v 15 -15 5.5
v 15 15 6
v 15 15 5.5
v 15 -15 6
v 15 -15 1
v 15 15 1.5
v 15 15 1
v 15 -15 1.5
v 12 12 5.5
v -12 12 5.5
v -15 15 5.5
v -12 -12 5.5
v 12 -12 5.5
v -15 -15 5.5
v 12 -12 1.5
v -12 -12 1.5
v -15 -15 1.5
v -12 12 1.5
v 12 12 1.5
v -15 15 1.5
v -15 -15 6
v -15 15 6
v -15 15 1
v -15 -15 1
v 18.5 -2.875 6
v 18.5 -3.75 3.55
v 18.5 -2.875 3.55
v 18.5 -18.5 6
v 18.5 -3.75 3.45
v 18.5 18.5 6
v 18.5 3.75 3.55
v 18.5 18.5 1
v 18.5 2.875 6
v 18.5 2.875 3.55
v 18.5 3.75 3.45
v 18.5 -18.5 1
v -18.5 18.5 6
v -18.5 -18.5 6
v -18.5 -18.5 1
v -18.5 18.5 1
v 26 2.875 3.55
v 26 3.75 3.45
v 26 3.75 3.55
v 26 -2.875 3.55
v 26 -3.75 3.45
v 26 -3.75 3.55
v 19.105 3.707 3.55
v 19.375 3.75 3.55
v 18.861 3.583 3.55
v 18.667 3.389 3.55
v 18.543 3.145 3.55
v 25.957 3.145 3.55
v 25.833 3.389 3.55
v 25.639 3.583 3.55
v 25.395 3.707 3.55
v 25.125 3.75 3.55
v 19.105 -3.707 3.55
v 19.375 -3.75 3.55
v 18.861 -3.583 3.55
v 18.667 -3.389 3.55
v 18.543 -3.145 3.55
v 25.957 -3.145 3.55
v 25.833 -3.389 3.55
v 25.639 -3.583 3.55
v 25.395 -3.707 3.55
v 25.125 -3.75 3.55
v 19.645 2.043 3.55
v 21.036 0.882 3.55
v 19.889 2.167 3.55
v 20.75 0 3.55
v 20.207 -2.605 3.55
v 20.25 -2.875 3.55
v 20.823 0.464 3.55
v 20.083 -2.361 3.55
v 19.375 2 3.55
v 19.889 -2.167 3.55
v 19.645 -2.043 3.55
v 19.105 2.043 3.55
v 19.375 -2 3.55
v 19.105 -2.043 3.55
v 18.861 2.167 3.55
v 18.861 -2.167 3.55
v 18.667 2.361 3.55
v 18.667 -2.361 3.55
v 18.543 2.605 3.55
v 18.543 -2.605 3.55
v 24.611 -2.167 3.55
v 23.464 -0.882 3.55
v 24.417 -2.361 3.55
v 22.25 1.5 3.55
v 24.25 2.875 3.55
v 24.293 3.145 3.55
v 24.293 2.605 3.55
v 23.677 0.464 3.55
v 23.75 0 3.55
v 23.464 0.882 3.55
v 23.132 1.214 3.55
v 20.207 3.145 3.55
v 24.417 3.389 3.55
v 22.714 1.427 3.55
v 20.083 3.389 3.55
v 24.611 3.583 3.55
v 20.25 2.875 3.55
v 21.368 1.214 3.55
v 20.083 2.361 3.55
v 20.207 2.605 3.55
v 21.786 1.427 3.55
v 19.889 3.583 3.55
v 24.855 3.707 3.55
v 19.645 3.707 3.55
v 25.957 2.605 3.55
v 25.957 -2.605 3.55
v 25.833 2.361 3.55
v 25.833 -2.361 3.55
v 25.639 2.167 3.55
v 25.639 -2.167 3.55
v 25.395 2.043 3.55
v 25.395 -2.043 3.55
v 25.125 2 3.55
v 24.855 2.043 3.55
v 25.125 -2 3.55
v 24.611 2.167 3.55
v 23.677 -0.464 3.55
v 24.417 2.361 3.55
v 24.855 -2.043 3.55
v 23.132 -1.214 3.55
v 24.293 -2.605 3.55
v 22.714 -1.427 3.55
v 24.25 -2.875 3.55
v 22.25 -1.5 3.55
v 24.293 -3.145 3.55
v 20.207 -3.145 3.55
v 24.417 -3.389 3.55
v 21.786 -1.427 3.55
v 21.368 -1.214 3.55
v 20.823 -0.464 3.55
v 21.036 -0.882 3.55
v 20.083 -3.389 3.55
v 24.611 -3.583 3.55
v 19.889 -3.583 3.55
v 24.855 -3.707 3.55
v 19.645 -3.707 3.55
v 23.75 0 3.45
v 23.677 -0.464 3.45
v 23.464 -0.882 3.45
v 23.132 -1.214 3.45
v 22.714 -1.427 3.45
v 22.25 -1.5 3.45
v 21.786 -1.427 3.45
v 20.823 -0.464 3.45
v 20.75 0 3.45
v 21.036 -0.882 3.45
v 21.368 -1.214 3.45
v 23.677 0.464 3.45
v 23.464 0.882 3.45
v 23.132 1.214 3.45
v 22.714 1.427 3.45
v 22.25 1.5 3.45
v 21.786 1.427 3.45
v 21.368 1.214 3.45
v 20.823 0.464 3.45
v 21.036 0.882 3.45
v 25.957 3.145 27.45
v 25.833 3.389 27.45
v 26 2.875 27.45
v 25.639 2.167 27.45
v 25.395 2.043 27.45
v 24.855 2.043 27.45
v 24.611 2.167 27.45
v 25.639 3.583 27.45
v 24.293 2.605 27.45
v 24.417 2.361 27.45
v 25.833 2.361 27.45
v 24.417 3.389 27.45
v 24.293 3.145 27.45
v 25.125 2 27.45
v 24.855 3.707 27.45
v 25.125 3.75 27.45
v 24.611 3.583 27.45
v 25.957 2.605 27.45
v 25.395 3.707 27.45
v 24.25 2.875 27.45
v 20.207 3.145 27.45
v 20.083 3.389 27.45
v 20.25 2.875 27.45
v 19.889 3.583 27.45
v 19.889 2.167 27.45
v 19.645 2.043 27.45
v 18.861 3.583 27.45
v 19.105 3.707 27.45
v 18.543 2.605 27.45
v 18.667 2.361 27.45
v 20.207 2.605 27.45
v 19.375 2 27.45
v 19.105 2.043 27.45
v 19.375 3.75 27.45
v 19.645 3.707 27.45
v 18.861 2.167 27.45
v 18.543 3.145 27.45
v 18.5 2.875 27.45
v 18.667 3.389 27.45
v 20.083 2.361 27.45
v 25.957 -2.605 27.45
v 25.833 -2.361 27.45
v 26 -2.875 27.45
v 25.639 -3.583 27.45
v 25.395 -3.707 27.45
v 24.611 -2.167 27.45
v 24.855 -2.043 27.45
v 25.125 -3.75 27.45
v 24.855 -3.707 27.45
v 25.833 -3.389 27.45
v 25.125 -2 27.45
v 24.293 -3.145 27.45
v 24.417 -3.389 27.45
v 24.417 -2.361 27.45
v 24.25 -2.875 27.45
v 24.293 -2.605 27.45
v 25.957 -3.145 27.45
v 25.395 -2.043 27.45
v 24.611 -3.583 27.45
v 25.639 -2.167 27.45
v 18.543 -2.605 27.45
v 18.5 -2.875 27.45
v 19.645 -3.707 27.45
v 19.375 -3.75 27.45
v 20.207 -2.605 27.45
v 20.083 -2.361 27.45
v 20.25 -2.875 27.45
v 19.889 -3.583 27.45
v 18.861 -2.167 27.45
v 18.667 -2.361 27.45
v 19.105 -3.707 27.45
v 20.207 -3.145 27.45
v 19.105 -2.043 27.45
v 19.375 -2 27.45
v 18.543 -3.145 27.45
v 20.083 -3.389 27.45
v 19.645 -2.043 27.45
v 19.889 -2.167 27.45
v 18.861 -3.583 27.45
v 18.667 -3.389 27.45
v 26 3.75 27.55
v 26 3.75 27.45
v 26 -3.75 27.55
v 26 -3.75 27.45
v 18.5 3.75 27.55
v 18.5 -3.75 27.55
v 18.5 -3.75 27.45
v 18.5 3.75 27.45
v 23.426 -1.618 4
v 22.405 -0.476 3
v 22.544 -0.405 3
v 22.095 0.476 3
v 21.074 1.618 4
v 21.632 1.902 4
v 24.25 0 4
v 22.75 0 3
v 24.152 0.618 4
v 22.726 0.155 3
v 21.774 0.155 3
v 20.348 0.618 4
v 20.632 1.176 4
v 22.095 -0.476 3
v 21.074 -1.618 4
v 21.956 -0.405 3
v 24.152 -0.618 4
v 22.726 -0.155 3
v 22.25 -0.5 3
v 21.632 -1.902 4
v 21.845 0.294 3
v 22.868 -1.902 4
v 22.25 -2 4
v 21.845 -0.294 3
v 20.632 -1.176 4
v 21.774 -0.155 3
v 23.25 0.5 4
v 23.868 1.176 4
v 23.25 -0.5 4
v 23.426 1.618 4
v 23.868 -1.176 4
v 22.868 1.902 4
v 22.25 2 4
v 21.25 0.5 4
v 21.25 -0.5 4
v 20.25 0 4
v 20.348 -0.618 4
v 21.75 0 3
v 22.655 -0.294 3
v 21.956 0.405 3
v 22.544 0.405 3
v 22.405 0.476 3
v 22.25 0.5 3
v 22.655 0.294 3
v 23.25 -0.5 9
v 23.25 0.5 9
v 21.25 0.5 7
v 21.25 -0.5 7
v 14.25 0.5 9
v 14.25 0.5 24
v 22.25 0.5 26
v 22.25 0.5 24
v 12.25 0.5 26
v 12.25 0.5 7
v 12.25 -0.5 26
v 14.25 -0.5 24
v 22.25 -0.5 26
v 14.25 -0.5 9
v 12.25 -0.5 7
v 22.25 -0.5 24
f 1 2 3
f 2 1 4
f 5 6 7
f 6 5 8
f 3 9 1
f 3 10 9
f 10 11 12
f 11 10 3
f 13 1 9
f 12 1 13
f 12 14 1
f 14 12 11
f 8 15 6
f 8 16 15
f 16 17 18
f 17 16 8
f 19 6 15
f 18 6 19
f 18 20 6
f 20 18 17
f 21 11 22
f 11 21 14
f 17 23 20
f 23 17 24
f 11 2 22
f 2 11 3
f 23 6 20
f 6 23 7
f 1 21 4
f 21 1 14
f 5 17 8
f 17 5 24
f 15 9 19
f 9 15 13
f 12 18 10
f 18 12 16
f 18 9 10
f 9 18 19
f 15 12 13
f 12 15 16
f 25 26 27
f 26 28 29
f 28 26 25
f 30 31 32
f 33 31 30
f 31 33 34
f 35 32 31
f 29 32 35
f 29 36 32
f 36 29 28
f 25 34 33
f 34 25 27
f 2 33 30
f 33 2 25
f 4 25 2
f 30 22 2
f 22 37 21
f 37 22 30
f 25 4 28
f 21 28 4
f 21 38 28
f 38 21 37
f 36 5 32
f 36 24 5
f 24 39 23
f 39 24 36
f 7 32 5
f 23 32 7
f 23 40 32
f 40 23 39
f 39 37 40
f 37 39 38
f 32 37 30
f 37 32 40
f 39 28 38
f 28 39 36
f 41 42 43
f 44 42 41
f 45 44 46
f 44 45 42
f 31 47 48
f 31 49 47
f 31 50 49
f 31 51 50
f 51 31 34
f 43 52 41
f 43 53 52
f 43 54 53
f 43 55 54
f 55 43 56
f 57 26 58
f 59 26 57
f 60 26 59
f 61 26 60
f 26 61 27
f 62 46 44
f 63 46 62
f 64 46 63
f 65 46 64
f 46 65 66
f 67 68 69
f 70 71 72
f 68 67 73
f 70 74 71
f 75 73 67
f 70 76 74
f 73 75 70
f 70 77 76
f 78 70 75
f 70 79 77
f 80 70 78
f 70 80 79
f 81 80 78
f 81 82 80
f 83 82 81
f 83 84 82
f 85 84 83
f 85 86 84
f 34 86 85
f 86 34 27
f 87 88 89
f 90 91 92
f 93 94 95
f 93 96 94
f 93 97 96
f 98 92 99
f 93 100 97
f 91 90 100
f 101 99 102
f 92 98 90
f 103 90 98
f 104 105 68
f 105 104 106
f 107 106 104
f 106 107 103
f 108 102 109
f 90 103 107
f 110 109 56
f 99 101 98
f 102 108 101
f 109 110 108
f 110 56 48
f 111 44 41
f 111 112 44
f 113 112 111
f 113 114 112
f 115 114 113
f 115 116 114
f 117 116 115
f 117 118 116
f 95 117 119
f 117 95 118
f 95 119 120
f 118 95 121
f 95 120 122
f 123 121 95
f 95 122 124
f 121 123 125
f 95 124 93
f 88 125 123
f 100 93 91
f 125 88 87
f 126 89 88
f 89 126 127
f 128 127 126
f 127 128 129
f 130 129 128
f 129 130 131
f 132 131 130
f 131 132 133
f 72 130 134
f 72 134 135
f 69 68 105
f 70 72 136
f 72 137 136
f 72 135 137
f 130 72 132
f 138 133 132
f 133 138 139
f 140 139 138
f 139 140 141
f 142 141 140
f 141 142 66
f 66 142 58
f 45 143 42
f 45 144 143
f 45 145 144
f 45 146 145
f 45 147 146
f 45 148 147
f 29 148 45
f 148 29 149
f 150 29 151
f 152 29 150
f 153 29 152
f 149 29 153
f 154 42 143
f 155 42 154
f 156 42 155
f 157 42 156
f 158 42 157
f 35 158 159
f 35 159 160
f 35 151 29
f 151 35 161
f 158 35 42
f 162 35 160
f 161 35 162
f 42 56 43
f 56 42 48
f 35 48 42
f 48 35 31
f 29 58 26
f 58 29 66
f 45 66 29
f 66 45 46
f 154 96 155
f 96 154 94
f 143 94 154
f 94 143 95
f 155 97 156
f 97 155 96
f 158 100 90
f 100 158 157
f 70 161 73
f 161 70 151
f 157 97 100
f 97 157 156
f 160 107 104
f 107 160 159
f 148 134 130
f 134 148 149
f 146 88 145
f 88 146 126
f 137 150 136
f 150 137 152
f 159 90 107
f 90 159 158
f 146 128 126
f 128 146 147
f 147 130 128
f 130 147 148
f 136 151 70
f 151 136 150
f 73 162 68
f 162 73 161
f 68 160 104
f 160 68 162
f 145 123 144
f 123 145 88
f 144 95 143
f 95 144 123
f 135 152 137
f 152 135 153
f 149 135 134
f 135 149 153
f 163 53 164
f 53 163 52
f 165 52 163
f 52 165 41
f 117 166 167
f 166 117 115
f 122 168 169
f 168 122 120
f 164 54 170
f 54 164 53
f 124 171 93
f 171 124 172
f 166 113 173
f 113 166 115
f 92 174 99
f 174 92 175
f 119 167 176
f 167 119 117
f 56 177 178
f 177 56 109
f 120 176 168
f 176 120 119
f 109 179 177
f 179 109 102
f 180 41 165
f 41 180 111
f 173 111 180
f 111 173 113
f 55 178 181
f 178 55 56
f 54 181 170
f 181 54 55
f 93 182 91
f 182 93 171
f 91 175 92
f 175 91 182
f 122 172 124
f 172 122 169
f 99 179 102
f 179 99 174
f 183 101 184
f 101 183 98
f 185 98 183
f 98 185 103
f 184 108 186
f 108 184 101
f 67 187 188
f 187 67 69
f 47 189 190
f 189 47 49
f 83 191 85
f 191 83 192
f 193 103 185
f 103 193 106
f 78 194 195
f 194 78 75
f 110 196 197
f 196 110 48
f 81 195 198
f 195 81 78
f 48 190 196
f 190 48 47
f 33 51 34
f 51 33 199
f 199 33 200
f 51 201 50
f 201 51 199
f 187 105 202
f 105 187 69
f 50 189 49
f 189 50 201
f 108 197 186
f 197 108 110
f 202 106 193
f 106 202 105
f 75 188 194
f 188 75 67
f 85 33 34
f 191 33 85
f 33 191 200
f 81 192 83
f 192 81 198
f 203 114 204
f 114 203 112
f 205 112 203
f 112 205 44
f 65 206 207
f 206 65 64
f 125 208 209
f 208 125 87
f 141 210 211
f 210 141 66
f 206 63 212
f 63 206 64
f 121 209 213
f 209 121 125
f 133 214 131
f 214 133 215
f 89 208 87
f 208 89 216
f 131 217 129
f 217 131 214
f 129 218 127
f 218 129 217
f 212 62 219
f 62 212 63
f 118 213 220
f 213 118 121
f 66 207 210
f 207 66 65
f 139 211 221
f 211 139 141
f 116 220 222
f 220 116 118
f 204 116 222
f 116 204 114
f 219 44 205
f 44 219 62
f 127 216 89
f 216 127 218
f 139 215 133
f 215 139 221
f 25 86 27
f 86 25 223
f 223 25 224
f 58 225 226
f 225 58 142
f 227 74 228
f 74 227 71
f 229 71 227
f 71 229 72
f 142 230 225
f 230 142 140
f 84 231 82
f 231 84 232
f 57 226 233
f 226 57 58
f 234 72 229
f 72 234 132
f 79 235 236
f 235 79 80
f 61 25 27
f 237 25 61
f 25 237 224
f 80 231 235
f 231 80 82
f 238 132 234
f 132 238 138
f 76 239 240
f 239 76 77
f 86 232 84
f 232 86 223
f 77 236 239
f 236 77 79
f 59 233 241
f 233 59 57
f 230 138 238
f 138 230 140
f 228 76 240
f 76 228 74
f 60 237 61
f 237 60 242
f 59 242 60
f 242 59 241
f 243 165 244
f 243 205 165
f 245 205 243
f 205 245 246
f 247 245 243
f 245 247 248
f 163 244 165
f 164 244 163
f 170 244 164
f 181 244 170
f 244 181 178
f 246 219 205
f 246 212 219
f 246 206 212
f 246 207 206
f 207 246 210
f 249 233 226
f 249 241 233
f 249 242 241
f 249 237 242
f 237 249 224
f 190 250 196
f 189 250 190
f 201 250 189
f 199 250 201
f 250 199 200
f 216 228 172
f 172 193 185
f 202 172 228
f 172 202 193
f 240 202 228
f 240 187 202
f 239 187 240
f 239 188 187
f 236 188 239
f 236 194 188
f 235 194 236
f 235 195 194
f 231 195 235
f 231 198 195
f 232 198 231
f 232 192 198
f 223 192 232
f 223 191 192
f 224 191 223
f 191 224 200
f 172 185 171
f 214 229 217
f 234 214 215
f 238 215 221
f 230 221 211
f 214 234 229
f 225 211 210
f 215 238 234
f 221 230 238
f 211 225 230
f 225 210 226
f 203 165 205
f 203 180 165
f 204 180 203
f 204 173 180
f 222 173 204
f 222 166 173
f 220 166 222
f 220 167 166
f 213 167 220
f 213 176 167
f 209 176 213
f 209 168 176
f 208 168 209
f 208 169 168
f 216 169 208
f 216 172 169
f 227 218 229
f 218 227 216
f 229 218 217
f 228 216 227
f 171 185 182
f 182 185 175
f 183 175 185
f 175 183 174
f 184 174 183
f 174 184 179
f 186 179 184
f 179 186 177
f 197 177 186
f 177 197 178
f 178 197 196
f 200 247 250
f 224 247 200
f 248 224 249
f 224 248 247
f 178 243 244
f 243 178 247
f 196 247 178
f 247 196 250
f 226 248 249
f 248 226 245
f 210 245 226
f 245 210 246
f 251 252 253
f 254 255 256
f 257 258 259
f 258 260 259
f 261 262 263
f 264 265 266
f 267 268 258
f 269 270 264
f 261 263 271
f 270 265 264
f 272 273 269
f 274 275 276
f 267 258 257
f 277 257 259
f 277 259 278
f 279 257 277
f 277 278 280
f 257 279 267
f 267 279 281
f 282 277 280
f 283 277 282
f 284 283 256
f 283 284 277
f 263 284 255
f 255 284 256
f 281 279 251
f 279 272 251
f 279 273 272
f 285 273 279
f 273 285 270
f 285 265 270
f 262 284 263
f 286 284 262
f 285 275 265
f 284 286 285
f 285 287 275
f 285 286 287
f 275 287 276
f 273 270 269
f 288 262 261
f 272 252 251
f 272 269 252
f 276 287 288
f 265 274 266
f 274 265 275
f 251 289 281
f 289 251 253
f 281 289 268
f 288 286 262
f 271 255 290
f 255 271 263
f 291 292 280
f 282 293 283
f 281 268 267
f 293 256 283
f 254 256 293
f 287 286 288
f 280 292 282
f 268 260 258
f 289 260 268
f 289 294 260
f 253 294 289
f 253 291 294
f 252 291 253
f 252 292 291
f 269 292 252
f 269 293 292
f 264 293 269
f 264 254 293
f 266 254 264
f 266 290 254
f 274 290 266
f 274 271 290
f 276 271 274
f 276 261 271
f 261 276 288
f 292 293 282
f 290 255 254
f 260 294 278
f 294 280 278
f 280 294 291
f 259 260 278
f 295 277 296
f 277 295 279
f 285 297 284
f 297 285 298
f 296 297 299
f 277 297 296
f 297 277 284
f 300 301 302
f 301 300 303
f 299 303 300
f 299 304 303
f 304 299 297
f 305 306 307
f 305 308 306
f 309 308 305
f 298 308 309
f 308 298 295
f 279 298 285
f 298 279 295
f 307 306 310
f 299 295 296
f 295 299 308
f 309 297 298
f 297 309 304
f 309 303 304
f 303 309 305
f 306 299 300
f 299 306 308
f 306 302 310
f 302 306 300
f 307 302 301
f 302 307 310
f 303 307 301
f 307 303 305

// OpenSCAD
$fn = 20;
FrameThickness = 3;
DriveBaseWidth = 30;
DriveBaseDepth = 30;
DriveBaseHeight = 4;
BumperThickness = 3.5;
BumperHeight = 5;

CageOffset = 3.5;//Deep cage
CageW = 7.5;

HookH = 4;
HookL = 10;
HookGripH = 16;
HookAngle = 0;

module Frame(W, D, H, T)
{
  difference()
  {
    cube([W, D, H], center = true);
    cube([W - (2*T), D - (2*T), H + .01], center = true);
  }
}

module DriveBase(DoBumpers)
{
  color("silver")
    Frame(DriveBaseWidth, DriveBaseDepth, DriveBaseHeight, FrameThickness);
  if (DoBumpers)
    color("Red")
      Frame(DriveBaseWidth + (2*BumperThickness), DriveBaseDepth  + (2*BumperThickness), BumperHeight, BumperThickness);
}

module Cage()
{  
  D = 1.75;
  H = 24;
  
  color("DarkGreen")
  {
    difference()
    {
      cube([CageW, CageW, .1], center = true);
      cylinder(d = 3, h = 1, $fn = 20, center = true);
    }
    translate([(CageW - D) / 2, (CageW - D) / 2, 0])
      cylinder(d = D, h = H, $fn = 20);
    translate([-(CageW - D) / 2, (CageW - D) / 2, 0])
      cylinder(d = D, h = H, $fn = 20);
    translate([(CageW - D) / 2, -(CageW - D) / 2, 0])
      cylinder(d = D, h = H, $fn = 20);
    translate([-(CageW - D) / 2, -(CageW - D) / 2, 0])
      cylinder(d = D, h = H, $fn = 20);
    translate([0, 0, H])
      cube([CageW, CageW, .1], center = true);
  }
}

module CageHook()
{
  translate([0, 0, HookH + 1 - 0.5])
  {
    rotate(-HookAngle, [0, 1, 0])
    {
      translate([HookL, 0, -HookH - 1])
      {
        //Cone
        cylinder(d1 = 1, d2 = 4, h = 1);
        //Vertical hook bumber spacer
        translate([-1, -0.5, 1])
          cube([2, 1, HookH]);
        //Horizontal bumber clearance
        translate([-HookL, -0.5, HookH])
          cube([HookL + 1, 1, 2]);
      }
      //Gripper vertical
      translate([0, -0.5, 0])
        cube([2, 1, HookGripH]);
      //Gripper horizontal
      translate([0, -0.5, HookGripH])
        cube([HookL, 1, 2]);
    }
  }
}

translate([0, 0, (BumperHeight / 2) + 1])
  DriveBase(true);

translate([((DriveBaseWidth + CageW) / 2) + BumperThickness, 0, CageOffset])
  Cage();

translate([((DriveBaseWidth + CageW) / 2) + BumperThickness - HookL, 0, CageOffset])
  CageHook();
